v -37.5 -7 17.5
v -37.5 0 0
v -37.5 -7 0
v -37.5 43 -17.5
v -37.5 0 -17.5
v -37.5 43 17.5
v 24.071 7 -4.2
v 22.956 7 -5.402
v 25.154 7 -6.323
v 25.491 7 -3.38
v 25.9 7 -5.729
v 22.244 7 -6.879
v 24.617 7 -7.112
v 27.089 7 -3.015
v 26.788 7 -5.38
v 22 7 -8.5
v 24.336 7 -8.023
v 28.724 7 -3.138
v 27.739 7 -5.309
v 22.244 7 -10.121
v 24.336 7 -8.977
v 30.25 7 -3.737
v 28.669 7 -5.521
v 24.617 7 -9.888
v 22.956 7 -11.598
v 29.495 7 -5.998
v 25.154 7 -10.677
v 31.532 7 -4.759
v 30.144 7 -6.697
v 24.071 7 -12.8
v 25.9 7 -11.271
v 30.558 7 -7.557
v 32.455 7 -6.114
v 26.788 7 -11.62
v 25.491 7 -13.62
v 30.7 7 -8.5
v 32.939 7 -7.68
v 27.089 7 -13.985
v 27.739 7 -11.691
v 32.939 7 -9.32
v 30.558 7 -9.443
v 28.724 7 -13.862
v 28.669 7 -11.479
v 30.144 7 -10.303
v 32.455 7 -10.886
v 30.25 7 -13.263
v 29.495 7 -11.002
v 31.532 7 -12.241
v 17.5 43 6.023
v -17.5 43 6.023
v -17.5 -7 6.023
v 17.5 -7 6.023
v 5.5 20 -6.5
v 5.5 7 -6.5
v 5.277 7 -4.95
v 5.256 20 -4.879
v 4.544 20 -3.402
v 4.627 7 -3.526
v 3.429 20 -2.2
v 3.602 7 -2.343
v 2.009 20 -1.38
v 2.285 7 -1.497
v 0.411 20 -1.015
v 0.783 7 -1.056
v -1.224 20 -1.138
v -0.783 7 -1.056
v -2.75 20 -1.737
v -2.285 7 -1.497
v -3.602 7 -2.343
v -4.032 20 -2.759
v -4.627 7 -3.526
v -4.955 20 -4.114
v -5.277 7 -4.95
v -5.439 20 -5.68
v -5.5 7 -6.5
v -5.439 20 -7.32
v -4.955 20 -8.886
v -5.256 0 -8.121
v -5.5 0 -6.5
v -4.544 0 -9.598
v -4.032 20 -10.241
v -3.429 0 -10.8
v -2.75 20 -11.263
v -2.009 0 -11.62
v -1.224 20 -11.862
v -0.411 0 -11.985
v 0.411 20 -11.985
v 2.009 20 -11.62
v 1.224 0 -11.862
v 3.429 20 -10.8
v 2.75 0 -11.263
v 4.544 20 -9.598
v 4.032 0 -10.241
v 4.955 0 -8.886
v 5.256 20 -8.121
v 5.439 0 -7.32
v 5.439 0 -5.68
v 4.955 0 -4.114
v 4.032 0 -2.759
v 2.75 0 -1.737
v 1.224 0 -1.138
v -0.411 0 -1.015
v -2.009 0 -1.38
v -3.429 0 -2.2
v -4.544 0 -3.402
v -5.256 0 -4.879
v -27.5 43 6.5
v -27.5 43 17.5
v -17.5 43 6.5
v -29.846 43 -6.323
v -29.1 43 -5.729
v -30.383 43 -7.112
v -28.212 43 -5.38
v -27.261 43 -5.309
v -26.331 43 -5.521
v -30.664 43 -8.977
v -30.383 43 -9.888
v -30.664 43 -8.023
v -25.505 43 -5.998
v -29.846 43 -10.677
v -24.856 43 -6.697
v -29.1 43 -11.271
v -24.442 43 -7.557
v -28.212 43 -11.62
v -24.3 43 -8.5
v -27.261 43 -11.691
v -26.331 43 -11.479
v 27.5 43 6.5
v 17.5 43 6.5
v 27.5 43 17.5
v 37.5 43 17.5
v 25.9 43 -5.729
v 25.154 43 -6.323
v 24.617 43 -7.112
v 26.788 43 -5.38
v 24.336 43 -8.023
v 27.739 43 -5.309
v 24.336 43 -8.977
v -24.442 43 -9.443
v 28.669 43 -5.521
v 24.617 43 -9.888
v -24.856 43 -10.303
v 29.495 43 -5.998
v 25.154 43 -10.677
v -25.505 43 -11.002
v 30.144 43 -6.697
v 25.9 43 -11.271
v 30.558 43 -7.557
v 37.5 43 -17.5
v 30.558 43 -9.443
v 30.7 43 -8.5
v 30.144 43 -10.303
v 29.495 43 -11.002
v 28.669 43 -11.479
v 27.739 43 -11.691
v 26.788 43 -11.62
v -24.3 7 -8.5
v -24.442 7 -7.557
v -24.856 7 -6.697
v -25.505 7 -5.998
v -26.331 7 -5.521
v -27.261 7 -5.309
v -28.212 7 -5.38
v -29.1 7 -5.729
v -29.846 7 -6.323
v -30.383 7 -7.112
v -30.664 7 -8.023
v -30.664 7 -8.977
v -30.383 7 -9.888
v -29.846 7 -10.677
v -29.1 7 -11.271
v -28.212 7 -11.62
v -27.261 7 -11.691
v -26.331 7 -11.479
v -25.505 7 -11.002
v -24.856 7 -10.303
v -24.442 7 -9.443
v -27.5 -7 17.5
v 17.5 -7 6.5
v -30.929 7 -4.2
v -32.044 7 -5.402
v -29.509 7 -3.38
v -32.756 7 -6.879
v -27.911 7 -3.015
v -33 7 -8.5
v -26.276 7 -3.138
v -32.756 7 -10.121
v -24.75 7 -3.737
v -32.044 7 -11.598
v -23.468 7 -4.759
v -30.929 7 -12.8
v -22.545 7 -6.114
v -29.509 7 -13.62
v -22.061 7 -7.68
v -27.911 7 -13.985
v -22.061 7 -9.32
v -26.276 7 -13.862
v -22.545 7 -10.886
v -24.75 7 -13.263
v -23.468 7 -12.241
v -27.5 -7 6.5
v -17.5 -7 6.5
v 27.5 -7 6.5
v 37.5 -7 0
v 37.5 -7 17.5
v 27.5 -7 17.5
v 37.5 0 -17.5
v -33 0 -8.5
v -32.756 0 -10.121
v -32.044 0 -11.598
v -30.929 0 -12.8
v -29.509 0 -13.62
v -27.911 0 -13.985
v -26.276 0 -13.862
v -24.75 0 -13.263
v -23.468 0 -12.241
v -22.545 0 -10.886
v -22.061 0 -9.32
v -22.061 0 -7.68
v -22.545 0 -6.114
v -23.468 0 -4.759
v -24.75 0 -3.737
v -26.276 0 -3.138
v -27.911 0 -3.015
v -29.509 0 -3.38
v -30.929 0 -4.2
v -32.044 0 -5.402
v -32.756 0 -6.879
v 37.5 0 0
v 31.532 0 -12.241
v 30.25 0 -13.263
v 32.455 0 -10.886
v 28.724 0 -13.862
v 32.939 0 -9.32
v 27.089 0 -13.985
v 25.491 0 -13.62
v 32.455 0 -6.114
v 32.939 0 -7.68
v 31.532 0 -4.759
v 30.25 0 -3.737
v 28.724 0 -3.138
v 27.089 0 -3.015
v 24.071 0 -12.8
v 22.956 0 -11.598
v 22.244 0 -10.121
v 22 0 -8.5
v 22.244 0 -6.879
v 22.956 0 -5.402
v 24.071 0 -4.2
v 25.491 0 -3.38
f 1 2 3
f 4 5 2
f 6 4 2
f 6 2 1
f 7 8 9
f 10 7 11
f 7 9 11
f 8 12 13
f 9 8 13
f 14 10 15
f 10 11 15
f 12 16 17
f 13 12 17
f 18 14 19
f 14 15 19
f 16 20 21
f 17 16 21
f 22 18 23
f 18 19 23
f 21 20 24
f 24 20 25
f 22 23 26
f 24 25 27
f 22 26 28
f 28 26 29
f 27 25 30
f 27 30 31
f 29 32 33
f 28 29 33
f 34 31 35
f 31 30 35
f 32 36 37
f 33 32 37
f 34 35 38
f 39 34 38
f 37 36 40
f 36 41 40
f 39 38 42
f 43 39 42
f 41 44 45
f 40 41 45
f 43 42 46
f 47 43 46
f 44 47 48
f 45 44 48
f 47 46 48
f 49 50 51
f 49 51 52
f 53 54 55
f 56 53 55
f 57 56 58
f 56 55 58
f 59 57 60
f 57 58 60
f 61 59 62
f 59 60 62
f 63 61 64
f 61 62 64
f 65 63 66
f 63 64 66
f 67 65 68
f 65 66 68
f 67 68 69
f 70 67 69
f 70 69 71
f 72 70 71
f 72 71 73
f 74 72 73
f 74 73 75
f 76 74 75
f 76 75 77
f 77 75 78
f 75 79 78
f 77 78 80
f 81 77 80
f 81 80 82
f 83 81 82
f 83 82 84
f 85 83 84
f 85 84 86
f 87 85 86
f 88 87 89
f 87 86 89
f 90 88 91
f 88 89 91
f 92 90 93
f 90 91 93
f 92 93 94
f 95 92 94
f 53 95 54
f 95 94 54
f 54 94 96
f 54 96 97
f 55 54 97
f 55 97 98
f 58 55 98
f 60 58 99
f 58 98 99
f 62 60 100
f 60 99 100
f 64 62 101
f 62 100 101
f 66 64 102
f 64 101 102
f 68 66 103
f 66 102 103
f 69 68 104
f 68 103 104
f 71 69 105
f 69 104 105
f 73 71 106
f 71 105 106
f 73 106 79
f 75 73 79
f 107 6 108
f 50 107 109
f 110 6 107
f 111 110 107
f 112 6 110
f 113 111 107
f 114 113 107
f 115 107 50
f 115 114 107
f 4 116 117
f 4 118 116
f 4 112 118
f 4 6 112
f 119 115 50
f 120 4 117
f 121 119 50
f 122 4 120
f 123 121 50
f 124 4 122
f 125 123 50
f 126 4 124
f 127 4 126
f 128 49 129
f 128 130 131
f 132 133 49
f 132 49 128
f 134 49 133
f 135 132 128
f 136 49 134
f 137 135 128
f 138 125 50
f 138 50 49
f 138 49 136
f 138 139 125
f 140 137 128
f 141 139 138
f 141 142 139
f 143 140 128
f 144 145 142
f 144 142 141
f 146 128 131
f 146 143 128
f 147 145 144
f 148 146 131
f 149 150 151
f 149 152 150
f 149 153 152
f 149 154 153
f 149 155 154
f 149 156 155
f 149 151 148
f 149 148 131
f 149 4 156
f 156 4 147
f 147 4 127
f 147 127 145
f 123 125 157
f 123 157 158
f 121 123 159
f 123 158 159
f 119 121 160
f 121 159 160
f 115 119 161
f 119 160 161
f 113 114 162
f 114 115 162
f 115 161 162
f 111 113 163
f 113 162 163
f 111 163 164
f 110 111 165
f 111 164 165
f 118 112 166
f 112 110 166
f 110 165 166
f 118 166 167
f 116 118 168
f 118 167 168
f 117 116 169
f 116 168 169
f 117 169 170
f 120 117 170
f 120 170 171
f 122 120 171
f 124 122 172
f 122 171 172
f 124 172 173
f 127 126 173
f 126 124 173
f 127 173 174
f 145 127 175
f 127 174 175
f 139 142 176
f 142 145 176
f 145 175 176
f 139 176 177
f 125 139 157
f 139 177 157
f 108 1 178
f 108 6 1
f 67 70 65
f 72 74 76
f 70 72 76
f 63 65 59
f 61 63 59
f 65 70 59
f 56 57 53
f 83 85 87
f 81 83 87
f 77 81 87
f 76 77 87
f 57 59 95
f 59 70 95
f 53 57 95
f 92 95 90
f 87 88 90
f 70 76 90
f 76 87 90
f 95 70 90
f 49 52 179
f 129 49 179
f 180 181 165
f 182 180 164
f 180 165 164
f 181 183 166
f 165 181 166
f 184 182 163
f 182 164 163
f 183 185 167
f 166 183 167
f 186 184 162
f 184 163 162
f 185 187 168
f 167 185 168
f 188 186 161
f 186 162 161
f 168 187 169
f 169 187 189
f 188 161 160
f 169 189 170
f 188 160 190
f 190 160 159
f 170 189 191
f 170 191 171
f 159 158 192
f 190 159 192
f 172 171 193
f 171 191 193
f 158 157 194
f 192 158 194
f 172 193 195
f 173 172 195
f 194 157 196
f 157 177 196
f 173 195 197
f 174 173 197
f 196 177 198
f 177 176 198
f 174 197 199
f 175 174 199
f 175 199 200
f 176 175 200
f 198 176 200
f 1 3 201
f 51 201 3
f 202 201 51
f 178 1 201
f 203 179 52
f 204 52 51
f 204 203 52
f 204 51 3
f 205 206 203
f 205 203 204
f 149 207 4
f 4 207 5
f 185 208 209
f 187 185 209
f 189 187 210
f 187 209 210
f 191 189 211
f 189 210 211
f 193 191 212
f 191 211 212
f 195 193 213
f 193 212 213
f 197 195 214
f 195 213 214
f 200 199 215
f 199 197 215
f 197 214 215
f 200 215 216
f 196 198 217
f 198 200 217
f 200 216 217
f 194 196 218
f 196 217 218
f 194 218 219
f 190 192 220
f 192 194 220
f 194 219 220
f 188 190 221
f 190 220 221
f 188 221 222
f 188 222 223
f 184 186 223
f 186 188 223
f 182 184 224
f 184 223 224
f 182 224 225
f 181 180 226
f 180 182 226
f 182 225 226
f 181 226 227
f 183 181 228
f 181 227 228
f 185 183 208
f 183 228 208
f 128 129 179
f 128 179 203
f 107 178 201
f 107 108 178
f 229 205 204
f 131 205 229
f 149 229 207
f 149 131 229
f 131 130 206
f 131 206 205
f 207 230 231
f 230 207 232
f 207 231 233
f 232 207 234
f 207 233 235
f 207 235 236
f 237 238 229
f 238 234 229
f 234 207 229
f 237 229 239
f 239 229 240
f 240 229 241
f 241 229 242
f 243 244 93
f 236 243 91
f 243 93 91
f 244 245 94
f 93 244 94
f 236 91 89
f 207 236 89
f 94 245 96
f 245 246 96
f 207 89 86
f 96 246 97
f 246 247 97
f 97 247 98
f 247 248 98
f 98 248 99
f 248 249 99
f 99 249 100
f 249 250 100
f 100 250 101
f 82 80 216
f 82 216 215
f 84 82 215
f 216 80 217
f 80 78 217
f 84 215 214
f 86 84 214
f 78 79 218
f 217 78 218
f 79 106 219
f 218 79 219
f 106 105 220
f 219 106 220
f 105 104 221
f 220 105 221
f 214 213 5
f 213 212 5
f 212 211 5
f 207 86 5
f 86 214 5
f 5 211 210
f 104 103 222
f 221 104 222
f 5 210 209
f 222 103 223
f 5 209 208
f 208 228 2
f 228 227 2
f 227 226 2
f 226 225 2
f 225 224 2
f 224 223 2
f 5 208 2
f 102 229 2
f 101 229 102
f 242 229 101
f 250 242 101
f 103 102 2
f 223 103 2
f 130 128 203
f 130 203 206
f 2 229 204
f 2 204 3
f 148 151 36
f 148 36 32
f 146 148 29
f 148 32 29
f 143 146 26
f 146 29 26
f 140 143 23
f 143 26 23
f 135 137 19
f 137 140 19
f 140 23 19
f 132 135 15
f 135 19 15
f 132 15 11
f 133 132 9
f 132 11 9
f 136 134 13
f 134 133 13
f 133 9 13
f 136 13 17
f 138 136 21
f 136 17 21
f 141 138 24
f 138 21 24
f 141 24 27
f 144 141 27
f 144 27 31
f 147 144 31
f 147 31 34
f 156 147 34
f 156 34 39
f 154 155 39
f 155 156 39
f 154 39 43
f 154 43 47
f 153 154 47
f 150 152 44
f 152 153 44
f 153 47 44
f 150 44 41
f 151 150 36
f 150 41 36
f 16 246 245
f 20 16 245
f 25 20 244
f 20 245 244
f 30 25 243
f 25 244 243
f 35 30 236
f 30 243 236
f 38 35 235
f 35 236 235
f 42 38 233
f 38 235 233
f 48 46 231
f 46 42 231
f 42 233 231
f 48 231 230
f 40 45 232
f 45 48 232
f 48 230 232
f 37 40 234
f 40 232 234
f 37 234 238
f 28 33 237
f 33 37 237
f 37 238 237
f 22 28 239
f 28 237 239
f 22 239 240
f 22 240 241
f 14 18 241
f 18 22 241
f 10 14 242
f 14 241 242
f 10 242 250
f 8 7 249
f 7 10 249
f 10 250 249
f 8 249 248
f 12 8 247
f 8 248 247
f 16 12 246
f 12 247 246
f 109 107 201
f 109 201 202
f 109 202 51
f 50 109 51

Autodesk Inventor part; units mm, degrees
ref_plane "YZ Plane" through (0, 0, 0) normal (1, 0, 0) x (0, 1, 0)
ref_plane "XZ Plane" through (0, 0, 0) normal (0, 1, 0) x (-1, 0, 0)
ref_plane "XY Plane" through (0, 0, 0) normal (0, 0, 1) x (1, 0, 0)
sketch "Sketch1" plane through (0, 0, 0) normal (0, 1, 0) x (-1, 0, 0)
  line L0 (-37.5, -17.5) -> (37.5, -17.5)
  line L1 (37.5, -17.5) -> (37.5, 17.5)
  line L2 (-37.5, 17.5) -> (-37.5, -17.5)
  line L3 (-37.5, -17.5) -> (37.5, 17.5) construction
  line L4 (37.5, -17.5) -> (-37.5, 17.5) construction
  line L5 (37.5, 17.5) -> (27.5, 17.5)
  line L6 (27.5, 17.5) -> (27.5, 6.5)
  line L7 (27.5, 6.5) -> (17.5, 6.5)
  line L8 (17.5, 6.5) -> (17.5, 6.0228)
  line L9 (17.5, 6.0228) -> (-17.5, 6.0228)
  line L10 (-17.5, 6.0228) -> (-17.5, 6.5)
  line L11 (-17.5, 6.5) -> (-27.5, 6.5)
  line L12 (-27.5, 6.5) -> (-27.5, 17.5)
  circle A0 centre (27.5, -8.5) radius 5.5
  circle A1 centre (-27.5, -8.5) radius 5.5
  circle A2 centre (0, -6.5) radius 5.5
  line L13 (37.5, 17.5) -> (27.5, 17.5)
  line L14 (-27.5, 17.5) -> (-37.5, 17.5)
  line L15 (-37.5, 1.5) -> (37.5, 1.5)
  line L16 (-37.5, 17.5) -> (-37.5, 1.5)
  line L17 (37.5, 1.5) -> (37.5, 17.5)
  line L18 (27.5, 17.5) -> (27.5, 6.5)
  line L19 (17.5, 6.5) -> (17.5, 6.0228)
  line L20 (-17.5, 6.0228) -> (-17.5, 6.5)
  line L21 (-27.5, 6.5) -> (-27.5, 17.5)
  line L22 (-37.5, 17.5) -> (-37.5, 1.5)
  point P0 (0, 0)
  point P1 (-32.5, 17.5)
  dimension "d0" = 75
  dimension "d1" = 35
  dimension "d2" = 10
  dimension "d3" = 11
  dimension "d4" = 10
  dimension "d5" = 35
  dimension "d6" = 10
  dimension "d7" = 11
  dimension "d8" = 11
  dimension "d10" = 11
  dimension "d12" = 27.5
  dimension "d13" = 27.5
  dimension "d41" = 16
extrude "Extrusion1" add sketch "Sketch1" along normal blind 7
sketch "Sketch2" plane through (0, 7, 0) normal (0, 1, 0) x (1, 0, 0)
  line L0 (-37.5, 17.5) -> (-37.5, -17.5) projected
  line L1 (-37.5, -17.5) -> (-37.5, 17.5)
  line L2 (37.5, 17.5) -> (-37.5, 17.5) projected
  line L3 (-37.5, 17.5) -> (37.5, 17.5)
  line L4 (37.5, -17.5) -> (37.5, 17.5) projected
  line L5 (37.5, 17.5) -> (37.5, -17.5)
  line L6 (27.5, -17.5) -> (37.5, -17.5) projected
  line L7 (37.5, -17.5) -> (27.5, -17.5)
  line L8 (27.5, -6.5) -> (27.5, -17.5) projected
  line L9 (27.5, -17.5) -> (27.5, -6.5)
  line L10 (17.5, -6.5) -> (27.5, -6.5) projected
  line L11 (27.5, -6.5) -> (17.5, -6.5)
  line L12 (17.5, -6.0228) -> (17.5, -6.5) projected
  line L13 (17.5, -6.5) -> (17.5, -6.0228)
  line L14 (-17.5, -6.0228) -> (17.5, -6.0228) projected
  line L15 (17.5, -6.0228) -> (-17.5, -6.0228)
  line L16 (-17.5, -6.0228) -> (-17.5, -6.5)
  line L17 (-27.5, -6.5) -> (-17.5, -6.5) projected
  line L18 (-17.5, -6.5) -> (-27.5, -6.5)
  line L19 (-27.5, -17.5) -> (-27.5, -6.5) projected
  line L20 (-27.5, -6.5) -> (-27.5, -17.5)
  line L21 (-37.5, -17.5) -> (-27.5, -17.5) projected
  line L22 (-27.5, -17.5) -> (-37.5, -17.5)
  circle A0 centre (27.5, 8.5) radius 3.2
  circle A1 centre (-27.5, 8.5) radius 3.2
  circle A2 centre (0, 6.5) radius 5.5
  point P0 (0, 0)
  point P1 (-32.5, -17.5)
  dimension "d17" = 6.4
  dimension "d24" = 6.4
  dimension "d25" = 27.5
  dimension "d26" = 27.5
  dimension "d27" = 26
  dimension "d28" = 26
  dimension "d29" = 11
  dimension "d30" = 24
extrude "Extrusion2" add sketch "Sketch2" along normal blind 13
sketch "Sketch3" plane through (0, 20, 0) normal (0, 1, 0) x (1, 0, 0)
  line L0 (-37.5, -17.5) -> (-27.5, -17.5) projected
  line L1 (-37.5, -17.5) -> (-27.5, -17.5)
  line L2 (-27.5, -17.5) -> (-27.5, -6.5) projected
  line L3 (-27.5, -17.5) -> (-27.5, -6.5)
  line L4 (-27.5, -6.5) -> (-17.5, -6.5) projected
  line L5 (-27.5, -6.5) -> (-17.5, -6.5)
  line L6 (-17.5, -6.5) -> (-17.5, -6.0228) projected
  line L7 (-17.5, -6.5) -> (-17.5, -6.0228)
  line L8 (-17.5, -6.0228) -> (17.5, -6.0228) projected
  line L9 (-17.5, -6.0228) -> (17.5, -6.0228)
  line L10 (17.5, -6.0228) -> (17.5, -6.5) projected
  line L11 (17.5, -6.0228) -> (17.5, -6.5)
  line L12 (17.5, -6.5) -> (27.5, -6.5) projected
  line L13 (17.5, -6.5) -> (27.5, -6.5)
  line L14 (27.5, -6.5) -> (27.5, -17.5) projected
  line L15 (27.5, -6.5) -> (27.5, -17.5)
  line L16 (27.5, -17.5) -> (37.5, -17.5) projected
  line L17 (27.5, -17.5) -> (37.5, -17.5)
  line L18 (37.5, 17.5) -> (-37.5, 17.5) projected
  line L19 (37.5, -17.5) -> (37.5, 17.5)
  line L20 (37.5, 17.5) -> (-37.5, 17.5)
  line L21 (-37.5, 17.5) -> (-37.5, -17.5) projected
  line L22 (-37.5, 17.5) -> (-37.5, -17.5)
  circle A0 centre (-27.5, 8.5) radius 3.2
  circle A1 centre (27.5, 8.5) radius 3.2
  point P0 (0, 0)
  point P1 (0, -6.0228)
  point P2 (0, -6.0228)
  dimension "d33" = 6.4
  dimension "d34" = 6.4
  dimension "d35" = 26
  dimension "d36" = 27.5
  dimension "d37" = 27.5
extrude "Extrusion3" add sketch "Sketch3" along normal blind 23
sketch "Sketch5" plane through (0, 0, 0) normal (0, -1, 0) x (1, 0, 0)
  line L0 (37.5, 17.5) -> (37.5, -17.5) projected
  line L1 (37.5, 0) -> (-37.5, 0)
  line L2 (-37.5, -17.5) -> (-37.5, 17.5) projected
  line L3 (-37.5, 17.5) -> (-27.5, 17.5) projected
  line L4 (-37.5, 17.5) -> (-27.5, 17.5)
  line L5 (-27.5, 17.5) -> (-27.5, 6.5) projected
  line L6 (-27.5, 17.5) -> (-27.5, 6.5)
  line L7 (-27.5, 6.5) -> (-17.5, 6.5) projected
  line L8 (-27.5, 6.5) -> (-17.5, 6.5)
  line L9 (-17.5, 6.0228) -> (17.5, 6.0228) projected
  line L10 (-17.5, 6.5) -> (-17.5, 6.0228)
  line L11 (-17.5, 6.0228) -> (17.5, 6.0228)
  line L12 (17.5, 6.0228) -> (17.5, 6.5)
  line L13 (17.5, 6.5) -> (27.5, 6.5) projected
  line L14 (17.5, 6.5) -> (27.5, 6.5)
  line L15 (27.5, 6.5) -> (27.5, 17.5) projected
  line L16 (27.5, 6.5) -> (27.5, 17.5)
  line L17 (27.5, 17.5) -> (37.5, 17.5) projected
  line L18 (27.5, 17.5) -> (37.5, 17.5)
  line L19 (37.5, 17.5) -> (37.5, 0)
  point P0 (0, 0)
extrude "Extrusion4" add sketch "Sketch5" along normal blind 7
properties part number "Lose backe" material "Steel"
